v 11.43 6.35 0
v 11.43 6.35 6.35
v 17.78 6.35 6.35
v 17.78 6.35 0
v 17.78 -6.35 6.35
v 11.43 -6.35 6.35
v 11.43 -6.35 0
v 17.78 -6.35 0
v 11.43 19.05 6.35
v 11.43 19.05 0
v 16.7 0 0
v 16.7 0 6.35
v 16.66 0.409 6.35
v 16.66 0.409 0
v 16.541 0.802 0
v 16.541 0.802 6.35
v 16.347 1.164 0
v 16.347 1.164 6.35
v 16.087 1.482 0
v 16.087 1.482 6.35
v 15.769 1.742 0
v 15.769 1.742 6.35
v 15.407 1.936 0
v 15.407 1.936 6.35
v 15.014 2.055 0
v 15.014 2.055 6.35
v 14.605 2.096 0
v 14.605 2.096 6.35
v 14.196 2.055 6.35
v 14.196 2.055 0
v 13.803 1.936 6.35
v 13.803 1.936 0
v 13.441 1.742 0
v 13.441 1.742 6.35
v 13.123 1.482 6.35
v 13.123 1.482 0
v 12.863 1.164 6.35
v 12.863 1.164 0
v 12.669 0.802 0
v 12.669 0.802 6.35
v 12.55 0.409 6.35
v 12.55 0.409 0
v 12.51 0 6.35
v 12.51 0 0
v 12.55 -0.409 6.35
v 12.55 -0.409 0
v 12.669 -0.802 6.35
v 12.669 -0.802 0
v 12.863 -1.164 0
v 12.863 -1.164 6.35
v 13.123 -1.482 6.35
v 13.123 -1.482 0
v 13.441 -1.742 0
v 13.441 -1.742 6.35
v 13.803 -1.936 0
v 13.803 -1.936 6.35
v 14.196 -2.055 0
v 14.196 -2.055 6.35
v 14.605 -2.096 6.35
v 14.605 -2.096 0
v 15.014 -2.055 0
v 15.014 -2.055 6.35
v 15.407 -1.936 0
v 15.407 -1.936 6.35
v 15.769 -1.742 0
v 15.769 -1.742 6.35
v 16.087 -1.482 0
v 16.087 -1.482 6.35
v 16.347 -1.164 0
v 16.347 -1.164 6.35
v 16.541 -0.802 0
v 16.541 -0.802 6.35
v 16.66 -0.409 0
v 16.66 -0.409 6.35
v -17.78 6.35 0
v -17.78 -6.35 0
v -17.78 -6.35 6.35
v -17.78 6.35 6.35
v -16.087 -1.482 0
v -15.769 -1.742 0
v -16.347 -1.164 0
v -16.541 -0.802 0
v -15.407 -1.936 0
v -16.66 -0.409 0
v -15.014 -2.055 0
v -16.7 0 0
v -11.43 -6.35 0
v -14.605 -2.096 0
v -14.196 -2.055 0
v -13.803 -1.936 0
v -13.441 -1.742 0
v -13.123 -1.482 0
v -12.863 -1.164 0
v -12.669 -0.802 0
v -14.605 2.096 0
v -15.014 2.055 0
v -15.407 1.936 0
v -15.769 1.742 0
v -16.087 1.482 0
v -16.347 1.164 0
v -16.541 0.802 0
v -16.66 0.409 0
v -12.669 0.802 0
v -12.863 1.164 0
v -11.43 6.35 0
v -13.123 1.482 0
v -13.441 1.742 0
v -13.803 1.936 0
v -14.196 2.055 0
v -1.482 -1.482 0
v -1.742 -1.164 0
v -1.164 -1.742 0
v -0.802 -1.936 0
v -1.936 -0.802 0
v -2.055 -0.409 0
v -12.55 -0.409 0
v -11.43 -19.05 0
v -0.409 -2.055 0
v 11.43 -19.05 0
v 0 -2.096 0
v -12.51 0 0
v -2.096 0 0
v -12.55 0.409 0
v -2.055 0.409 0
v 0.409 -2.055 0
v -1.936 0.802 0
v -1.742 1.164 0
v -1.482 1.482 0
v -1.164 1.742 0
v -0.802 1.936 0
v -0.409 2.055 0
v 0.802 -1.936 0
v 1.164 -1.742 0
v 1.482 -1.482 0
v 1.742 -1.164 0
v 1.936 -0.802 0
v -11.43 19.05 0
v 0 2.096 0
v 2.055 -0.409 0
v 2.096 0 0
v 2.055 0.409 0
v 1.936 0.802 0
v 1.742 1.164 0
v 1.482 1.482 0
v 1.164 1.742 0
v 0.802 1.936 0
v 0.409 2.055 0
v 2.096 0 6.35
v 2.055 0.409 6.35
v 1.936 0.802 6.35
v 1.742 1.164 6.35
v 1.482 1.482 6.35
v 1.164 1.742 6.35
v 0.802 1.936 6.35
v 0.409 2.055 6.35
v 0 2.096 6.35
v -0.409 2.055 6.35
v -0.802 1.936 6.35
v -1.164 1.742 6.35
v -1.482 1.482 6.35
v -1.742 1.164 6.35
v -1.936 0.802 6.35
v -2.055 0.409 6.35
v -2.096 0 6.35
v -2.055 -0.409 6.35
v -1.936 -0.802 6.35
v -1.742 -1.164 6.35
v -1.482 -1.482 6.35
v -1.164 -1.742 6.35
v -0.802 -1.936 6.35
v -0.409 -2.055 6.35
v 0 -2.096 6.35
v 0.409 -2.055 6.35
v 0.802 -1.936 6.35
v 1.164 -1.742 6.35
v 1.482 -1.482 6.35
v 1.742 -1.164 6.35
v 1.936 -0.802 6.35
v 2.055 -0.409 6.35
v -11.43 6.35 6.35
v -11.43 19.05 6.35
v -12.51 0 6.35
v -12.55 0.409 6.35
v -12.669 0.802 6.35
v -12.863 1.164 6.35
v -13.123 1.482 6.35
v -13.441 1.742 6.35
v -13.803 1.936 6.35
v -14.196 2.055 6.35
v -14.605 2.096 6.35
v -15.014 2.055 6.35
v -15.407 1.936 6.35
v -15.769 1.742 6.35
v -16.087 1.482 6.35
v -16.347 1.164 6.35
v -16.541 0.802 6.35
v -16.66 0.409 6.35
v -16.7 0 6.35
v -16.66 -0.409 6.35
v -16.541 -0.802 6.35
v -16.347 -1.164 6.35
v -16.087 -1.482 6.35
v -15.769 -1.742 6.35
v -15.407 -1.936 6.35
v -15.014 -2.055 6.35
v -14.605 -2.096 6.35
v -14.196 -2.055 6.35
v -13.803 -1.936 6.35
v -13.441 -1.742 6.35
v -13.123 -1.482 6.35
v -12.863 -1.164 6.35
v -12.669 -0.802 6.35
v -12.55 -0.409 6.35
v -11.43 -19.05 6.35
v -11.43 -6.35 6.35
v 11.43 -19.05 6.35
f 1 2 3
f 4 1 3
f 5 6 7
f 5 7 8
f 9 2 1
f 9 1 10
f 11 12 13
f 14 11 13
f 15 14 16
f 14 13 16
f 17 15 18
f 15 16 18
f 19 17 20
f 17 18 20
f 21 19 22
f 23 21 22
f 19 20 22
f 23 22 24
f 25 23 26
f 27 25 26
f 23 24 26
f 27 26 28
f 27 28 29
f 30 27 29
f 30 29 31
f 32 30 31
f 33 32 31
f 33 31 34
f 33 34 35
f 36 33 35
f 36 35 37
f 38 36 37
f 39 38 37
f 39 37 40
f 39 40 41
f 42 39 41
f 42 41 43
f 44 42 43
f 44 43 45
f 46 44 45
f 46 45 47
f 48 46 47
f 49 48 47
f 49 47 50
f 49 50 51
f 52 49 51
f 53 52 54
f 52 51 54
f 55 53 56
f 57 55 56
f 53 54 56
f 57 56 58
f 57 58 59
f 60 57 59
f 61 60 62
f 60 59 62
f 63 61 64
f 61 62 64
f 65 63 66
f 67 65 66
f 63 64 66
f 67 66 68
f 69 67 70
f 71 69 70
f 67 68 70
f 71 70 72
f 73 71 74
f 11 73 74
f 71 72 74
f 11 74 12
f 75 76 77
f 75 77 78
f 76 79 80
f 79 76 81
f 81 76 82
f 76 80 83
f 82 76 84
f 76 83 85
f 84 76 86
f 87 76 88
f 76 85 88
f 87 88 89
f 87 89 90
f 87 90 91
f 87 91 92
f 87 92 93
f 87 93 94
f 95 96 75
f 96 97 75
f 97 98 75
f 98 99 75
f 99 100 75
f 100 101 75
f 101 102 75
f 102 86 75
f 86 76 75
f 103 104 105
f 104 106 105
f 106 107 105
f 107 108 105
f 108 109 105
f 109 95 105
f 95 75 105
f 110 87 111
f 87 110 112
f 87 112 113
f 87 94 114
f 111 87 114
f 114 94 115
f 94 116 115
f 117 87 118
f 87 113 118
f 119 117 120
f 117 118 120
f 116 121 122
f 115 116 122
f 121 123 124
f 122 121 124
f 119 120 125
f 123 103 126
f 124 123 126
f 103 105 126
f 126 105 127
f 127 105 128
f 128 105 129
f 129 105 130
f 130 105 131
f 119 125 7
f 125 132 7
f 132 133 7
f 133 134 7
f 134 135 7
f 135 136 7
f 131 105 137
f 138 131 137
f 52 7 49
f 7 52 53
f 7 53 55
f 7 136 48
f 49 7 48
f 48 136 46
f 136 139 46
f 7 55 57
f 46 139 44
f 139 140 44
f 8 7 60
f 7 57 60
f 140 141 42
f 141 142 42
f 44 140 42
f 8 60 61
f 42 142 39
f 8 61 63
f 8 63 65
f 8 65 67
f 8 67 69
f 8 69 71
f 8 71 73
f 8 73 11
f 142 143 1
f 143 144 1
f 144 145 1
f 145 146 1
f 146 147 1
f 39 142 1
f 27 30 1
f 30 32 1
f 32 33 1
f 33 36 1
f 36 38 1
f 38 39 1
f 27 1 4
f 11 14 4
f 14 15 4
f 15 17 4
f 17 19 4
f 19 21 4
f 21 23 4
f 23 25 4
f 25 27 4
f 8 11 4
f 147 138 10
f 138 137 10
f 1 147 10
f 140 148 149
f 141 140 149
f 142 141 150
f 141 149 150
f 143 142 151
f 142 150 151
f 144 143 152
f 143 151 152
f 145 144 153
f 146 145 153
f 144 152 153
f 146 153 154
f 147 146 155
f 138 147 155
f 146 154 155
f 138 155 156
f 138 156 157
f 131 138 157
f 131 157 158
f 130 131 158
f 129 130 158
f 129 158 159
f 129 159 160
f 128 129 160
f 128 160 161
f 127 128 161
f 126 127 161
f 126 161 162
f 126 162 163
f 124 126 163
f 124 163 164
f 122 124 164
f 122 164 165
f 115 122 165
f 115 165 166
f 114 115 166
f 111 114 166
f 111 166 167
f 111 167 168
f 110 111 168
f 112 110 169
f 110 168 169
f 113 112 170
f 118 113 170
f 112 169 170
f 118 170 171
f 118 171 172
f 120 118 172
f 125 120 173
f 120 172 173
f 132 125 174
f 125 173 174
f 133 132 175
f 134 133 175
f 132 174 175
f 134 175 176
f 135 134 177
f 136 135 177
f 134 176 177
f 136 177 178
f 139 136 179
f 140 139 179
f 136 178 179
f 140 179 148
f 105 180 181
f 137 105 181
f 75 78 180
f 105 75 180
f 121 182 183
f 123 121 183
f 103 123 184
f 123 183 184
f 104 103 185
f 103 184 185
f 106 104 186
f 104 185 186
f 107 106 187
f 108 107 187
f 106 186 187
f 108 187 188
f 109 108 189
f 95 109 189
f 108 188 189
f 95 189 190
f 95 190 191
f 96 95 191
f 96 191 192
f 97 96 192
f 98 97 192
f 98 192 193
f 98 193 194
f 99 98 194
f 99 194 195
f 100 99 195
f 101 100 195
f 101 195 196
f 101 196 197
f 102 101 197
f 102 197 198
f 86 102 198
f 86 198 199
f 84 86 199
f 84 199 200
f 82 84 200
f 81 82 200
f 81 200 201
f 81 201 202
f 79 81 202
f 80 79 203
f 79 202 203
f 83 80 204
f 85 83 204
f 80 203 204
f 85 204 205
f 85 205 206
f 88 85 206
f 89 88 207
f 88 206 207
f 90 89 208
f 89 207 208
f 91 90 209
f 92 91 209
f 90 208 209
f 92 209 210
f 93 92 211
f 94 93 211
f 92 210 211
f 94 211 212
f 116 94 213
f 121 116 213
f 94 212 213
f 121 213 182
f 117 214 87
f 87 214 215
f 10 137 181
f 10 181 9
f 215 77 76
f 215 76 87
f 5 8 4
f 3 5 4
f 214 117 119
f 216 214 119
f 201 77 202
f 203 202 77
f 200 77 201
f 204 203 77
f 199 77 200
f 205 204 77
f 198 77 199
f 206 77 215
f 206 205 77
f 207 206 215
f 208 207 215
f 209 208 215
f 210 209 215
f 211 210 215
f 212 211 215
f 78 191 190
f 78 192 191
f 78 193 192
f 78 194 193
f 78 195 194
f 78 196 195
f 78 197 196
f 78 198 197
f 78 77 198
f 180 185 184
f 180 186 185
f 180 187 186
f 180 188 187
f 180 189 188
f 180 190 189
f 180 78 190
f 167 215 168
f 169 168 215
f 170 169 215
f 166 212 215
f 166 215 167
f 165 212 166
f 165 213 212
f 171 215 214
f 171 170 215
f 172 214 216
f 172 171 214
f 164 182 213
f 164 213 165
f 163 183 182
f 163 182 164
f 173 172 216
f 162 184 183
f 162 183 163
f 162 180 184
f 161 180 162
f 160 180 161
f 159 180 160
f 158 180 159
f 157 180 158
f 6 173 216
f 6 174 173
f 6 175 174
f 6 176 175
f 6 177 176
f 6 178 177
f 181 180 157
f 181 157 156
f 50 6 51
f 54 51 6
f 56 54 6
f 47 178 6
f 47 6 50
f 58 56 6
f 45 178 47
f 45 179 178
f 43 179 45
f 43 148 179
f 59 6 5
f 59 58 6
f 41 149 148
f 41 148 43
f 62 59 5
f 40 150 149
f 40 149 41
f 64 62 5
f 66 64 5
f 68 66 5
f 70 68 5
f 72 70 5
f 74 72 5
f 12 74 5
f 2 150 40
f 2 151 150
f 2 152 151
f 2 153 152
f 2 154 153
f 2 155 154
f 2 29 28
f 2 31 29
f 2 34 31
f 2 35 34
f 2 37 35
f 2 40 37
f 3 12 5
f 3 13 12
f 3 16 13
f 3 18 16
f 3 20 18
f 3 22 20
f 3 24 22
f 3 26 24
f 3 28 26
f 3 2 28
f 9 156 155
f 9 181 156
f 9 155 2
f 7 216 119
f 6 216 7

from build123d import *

# Parameters (mm, degrees)
SKETCH1_W           = 35.56
SKETCH1_H           = 38.1
BOSS_EXTRUDE1_DEPTH = 6.35
SKETCH2_W           = 6.35
SKETCH2_H           = 12.7
CUT_EXTRUDE1_DEPTH  = 27.820764344
SKETCH3_R           = 2.0955
CUT_EXTRUDE2_DEPTH  = 27.820764344
SKETCH4_R           = 2.0955
CUT_EXTRUDE3_DEPTH  = 27.820764344


with BuildPart() as part:
    # Sketch1 → Boss-Extrude1 (new body)
    with BuildSketch(Plane.XY):
        Rectangle(SKETCH1_W, SKETCH1_H)
    extrude(amount=BOSS_EXTRUDE1_DEPTH)

    # Sketch2 → Cut-Extrude1 (cut, through all)
    with BuildSketch(Plane.XY.offset(6.35)):
        with Locations((14.605, -12.7)):
            Rectangle(SKETCH2_W, SKETCH2_H)
        with Locations((14.605, 12.7)):
            Rectangle(SKETCH2_W, SKETCH2_H)
        with Locations((-14.605, 12.7)):
            Rectangle(SKETCH2_W, SKETCH2_H)
        with Locations((-14.605, -12.7)):
            Rectangle(SKETCH2_W, SKETCH2_H)
    extrude(amount=-CUT_EXTRUDE1_DEPTH, mode=Mode.SUBTRACT)

    # Sketch3 → Cut-Extrude2 (cut, through all)
    with BuildSketch(Plane.XY.offset(6.35)):
        with Locations((14.605, 0)):
            Circle(SKETCH3_R)
        with Locations((-14.605, 0)):
            Circle(SKETCH3_R)
    extrude(amount=-CUT_EXTRUDE2_DEPTH, mode=Mode.SUBTRACT)

    # Sketch4 → Cut-Extrude3 (cut, through all)
    with BuildSketch(Plane.XY.offset(6.35)):
        Circle(SKETCH4_R)
    extrude(amount=-CUT_EXTRUDE3_DEPTH, mode=Mode.SUBTRACT)


solid = part.part
